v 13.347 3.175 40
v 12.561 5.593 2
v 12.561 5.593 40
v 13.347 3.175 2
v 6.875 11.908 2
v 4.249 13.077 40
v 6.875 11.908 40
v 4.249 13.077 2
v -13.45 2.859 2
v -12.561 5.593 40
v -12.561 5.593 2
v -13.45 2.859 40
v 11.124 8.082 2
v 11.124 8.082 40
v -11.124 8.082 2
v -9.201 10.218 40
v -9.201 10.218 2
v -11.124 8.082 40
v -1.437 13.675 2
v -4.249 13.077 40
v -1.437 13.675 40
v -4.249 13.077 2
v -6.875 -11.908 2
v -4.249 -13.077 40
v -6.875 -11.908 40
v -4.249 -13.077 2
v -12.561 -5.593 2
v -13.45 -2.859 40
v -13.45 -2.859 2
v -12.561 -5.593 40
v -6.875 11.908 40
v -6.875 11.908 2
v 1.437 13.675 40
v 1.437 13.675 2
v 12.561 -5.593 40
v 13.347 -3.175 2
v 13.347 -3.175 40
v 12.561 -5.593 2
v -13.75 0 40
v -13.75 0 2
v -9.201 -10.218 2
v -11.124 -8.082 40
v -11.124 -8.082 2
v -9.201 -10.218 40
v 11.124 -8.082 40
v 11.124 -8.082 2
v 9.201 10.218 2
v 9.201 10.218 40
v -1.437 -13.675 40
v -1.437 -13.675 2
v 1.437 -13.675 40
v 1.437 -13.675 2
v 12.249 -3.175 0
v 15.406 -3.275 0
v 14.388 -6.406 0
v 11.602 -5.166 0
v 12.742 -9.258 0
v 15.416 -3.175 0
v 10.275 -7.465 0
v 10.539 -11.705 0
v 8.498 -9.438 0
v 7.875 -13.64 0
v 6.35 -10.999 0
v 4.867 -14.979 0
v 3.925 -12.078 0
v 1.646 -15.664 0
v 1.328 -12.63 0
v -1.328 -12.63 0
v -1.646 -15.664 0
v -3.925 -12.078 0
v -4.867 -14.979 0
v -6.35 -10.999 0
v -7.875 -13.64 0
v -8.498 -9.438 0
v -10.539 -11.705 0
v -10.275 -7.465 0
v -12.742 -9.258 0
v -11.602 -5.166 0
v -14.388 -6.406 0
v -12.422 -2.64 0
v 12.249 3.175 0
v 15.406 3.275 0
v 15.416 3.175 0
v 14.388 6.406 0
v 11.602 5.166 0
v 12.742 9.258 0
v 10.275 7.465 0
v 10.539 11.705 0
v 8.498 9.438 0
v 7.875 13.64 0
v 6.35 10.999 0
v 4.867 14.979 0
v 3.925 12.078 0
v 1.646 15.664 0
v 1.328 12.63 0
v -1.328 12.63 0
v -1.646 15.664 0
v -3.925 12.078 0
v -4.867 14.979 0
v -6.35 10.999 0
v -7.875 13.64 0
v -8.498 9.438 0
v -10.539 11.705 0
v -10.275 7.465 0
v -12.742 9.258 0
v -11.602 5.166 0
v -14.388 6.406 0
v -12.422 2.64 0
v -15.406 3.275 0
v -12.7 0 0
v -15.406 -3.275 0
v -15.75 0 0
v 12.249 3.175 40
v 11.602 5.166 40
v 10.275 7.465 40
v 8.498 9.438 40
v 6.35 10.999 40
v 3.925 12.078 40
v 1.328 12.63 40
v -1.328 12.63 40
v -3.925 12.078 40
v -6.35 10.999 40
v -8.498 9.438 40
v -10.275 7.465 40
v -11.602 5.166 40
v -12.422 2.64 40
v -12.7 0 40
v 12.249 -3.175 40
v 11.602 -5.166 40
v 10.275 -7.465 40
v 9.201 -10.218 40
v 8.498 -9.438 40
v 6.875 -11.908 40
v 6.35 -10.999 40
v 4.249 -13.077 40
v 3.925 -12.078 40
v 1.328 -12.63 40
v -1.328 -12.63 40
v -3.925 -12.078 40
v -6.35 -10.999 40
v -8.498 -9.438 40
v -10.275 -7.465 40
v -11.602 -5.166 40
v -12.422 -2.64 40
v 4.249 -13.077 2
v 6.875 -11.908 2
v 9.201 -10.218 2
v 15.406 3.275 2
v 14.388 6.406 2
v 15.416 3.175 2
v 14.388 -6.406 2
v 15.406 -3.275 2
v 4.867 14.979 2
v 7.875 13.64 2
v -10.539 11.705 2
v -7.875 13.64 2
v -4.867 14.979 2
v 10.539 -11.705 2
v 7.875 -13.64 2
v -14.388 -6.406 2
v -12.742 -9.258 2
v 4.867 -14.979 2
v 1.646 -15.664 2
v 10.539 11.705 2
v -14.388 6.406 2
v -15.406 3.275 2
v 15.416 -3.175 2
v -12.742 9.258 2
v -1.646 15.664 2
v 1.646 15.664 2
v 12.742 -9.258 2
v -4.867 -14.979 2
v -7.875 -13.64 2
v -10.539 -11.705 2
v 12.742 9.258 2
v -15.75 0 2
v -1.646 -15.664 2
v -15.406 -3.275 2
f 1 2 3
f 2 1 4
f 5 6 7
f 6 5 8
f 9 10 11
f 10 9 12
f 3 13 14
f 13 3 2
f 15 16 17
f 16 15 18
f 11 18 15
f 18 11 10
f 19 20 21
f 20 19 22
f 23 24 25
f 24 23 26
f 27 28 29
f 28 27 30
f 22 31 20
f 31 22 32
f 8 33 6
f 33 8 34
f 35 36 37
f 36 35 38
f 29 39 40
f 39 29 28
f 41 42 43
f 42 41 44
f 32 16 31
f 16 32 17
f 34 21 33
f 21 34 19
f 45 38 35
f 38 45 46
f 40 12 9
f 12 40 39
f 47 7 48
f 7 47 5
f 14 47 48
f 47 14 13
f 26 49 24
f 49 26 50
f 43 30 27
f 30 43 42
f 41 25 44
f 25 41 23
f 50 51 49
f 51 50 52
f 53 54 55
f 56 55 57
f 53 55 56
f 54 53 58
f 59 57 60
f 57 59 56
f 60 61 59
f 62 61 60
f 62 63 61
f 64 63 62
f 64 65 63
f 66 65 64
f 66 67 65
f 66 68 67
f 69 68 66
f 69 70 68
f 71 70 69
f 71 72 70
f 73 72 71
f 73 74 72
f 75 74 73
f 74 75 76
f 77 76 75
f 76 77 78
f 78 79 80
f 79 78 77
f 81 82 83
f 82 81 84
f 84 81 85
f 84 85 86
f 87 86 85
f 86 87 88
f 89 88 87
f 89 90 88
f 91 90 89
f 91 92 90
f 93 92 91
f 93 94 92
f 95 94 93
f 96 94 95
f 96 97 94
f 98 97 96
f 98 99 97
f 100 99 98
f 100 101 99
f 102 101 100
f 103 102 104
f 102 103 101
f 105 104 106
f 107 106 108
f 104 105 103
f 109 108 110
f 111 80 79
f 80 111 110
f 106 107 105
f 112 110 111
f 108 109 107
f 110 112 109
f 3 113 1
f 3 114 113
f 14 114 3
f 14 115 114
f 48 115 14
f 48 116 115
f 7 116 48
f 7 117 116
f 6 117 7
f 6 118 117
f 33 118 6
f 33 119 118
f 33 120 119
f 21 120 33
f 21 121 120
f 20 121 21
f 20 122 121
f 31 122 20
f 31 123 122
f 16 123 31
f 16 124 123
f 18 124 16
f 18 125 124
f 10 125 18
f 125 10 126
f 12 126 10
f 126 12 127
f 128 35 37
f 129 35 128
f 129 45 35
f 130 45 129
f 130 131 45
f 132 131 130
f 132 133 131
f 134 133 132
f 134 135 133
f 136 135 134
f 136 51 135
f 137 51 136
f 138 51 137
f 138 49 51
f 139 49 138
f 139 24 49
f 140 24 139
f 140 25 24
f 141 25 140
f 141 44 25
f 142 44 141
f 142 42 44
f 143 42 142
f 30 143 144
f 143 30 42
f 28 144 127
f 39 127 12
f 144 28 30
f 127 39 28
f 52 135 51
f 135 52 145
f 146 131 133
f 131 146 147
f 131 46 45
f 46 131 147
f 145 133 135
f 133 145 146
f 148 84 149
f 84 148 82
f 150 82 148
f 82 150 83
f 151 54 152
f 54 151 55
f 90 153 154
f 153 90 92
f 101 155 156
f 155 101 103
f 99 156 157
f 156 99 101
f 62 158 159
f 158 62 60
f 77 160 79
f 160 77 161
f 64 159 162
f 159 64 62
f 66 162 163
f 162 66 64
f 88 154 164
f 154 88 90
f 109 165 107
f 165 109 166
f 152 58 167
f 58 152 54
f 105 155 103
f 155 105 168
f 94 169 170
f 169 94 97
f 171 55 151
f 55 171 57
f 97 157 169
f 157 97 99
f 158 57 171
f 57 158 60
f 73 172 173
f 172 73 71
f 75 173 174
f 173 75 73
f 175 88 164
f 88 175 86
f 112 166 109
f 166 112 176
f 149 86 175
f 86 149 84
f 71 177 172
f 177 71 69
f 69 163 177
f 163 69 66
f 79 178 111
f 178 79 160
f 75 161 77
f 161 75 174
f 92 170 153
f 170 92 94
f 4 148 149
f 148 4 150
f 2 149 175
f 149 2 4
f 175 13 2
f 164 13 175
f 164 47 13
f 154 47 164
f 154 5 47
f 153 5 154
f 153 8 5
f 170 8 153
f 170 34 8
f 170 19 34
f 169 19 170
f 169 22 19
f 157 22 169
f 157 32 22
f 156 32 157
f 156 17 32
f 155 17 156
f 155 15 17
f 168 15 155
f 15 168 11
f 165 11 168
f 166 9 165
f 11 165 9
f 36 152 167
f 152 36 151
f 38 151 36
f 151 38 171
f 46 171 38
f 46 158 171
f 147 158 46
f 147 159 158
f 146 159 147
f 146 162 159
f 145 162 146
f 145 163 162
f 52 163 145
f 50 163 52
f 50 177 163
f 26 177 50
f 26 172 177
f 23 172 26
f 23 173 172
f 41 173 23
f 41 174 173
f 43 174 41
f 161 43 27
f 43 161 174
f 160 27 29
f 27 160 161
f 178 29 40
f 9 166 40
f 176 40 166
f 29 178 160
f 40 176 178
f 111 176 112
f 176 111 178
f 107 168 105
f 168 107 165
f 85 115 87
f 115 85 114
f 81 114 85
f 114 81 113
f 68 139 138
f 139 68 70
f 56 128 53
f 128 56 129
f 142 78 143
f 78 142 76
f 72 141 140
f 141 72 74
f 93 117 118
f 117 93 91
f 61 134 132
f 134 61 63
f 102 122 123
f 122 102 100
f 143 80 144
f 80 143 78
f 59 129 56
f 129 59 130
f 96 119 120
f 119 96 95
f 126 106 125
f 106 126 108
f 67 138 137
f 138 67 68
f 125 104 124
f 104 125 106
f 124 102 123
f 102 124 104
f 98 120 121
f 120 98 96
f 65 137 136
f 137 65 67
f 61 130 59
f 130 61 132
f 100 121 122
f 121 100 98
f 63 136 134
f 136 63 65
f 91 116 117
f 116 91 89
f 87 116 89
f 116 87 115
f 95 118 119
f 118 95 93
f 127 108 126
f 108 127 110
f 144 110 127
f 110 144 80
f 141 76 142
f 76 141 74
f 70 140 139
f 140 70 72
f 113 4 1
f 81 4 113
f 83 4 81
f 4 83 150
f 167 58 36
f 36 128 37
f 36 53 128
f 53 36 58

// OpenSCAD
// Customizable tube collar
// Created by Kjell Kernen
// Date 14.9.2015

/*[Colar Parameters]*/
// of the collar in tens of mm:
inner_diameter=254;       // [20:1000]

// of the collar in tens of mm:
outer_diameter=275;      // [30:1010]

// of the collar in tens of mm:
total_height=400;       // [30:1000]

// of the flange in tens of mm:
flange_height=20;// [10:100]

// of the flange in tens of mm:
flange_width=40;// [10:100]

/*[Hidden]*/


difference()
{
    difference()
    {
        union()
        {
            cylinder(r=(outer_diameter/20), h=total_height/10);	
            cylinder(r=((outer_diameter + flange_width)/20), h=flange_height/10);	
        }
        translate([0,0,-1])
            cylinder(r=(inner_diameter/20), h=(total_height/10) + 2);	
    }
    translate([0,-inner_diameter/80,-1]) 
        cube(size=[(inner_diameter + flange_width + 100 ) /20, inner_diameter/40 , total_height/10 + 2]);
}
